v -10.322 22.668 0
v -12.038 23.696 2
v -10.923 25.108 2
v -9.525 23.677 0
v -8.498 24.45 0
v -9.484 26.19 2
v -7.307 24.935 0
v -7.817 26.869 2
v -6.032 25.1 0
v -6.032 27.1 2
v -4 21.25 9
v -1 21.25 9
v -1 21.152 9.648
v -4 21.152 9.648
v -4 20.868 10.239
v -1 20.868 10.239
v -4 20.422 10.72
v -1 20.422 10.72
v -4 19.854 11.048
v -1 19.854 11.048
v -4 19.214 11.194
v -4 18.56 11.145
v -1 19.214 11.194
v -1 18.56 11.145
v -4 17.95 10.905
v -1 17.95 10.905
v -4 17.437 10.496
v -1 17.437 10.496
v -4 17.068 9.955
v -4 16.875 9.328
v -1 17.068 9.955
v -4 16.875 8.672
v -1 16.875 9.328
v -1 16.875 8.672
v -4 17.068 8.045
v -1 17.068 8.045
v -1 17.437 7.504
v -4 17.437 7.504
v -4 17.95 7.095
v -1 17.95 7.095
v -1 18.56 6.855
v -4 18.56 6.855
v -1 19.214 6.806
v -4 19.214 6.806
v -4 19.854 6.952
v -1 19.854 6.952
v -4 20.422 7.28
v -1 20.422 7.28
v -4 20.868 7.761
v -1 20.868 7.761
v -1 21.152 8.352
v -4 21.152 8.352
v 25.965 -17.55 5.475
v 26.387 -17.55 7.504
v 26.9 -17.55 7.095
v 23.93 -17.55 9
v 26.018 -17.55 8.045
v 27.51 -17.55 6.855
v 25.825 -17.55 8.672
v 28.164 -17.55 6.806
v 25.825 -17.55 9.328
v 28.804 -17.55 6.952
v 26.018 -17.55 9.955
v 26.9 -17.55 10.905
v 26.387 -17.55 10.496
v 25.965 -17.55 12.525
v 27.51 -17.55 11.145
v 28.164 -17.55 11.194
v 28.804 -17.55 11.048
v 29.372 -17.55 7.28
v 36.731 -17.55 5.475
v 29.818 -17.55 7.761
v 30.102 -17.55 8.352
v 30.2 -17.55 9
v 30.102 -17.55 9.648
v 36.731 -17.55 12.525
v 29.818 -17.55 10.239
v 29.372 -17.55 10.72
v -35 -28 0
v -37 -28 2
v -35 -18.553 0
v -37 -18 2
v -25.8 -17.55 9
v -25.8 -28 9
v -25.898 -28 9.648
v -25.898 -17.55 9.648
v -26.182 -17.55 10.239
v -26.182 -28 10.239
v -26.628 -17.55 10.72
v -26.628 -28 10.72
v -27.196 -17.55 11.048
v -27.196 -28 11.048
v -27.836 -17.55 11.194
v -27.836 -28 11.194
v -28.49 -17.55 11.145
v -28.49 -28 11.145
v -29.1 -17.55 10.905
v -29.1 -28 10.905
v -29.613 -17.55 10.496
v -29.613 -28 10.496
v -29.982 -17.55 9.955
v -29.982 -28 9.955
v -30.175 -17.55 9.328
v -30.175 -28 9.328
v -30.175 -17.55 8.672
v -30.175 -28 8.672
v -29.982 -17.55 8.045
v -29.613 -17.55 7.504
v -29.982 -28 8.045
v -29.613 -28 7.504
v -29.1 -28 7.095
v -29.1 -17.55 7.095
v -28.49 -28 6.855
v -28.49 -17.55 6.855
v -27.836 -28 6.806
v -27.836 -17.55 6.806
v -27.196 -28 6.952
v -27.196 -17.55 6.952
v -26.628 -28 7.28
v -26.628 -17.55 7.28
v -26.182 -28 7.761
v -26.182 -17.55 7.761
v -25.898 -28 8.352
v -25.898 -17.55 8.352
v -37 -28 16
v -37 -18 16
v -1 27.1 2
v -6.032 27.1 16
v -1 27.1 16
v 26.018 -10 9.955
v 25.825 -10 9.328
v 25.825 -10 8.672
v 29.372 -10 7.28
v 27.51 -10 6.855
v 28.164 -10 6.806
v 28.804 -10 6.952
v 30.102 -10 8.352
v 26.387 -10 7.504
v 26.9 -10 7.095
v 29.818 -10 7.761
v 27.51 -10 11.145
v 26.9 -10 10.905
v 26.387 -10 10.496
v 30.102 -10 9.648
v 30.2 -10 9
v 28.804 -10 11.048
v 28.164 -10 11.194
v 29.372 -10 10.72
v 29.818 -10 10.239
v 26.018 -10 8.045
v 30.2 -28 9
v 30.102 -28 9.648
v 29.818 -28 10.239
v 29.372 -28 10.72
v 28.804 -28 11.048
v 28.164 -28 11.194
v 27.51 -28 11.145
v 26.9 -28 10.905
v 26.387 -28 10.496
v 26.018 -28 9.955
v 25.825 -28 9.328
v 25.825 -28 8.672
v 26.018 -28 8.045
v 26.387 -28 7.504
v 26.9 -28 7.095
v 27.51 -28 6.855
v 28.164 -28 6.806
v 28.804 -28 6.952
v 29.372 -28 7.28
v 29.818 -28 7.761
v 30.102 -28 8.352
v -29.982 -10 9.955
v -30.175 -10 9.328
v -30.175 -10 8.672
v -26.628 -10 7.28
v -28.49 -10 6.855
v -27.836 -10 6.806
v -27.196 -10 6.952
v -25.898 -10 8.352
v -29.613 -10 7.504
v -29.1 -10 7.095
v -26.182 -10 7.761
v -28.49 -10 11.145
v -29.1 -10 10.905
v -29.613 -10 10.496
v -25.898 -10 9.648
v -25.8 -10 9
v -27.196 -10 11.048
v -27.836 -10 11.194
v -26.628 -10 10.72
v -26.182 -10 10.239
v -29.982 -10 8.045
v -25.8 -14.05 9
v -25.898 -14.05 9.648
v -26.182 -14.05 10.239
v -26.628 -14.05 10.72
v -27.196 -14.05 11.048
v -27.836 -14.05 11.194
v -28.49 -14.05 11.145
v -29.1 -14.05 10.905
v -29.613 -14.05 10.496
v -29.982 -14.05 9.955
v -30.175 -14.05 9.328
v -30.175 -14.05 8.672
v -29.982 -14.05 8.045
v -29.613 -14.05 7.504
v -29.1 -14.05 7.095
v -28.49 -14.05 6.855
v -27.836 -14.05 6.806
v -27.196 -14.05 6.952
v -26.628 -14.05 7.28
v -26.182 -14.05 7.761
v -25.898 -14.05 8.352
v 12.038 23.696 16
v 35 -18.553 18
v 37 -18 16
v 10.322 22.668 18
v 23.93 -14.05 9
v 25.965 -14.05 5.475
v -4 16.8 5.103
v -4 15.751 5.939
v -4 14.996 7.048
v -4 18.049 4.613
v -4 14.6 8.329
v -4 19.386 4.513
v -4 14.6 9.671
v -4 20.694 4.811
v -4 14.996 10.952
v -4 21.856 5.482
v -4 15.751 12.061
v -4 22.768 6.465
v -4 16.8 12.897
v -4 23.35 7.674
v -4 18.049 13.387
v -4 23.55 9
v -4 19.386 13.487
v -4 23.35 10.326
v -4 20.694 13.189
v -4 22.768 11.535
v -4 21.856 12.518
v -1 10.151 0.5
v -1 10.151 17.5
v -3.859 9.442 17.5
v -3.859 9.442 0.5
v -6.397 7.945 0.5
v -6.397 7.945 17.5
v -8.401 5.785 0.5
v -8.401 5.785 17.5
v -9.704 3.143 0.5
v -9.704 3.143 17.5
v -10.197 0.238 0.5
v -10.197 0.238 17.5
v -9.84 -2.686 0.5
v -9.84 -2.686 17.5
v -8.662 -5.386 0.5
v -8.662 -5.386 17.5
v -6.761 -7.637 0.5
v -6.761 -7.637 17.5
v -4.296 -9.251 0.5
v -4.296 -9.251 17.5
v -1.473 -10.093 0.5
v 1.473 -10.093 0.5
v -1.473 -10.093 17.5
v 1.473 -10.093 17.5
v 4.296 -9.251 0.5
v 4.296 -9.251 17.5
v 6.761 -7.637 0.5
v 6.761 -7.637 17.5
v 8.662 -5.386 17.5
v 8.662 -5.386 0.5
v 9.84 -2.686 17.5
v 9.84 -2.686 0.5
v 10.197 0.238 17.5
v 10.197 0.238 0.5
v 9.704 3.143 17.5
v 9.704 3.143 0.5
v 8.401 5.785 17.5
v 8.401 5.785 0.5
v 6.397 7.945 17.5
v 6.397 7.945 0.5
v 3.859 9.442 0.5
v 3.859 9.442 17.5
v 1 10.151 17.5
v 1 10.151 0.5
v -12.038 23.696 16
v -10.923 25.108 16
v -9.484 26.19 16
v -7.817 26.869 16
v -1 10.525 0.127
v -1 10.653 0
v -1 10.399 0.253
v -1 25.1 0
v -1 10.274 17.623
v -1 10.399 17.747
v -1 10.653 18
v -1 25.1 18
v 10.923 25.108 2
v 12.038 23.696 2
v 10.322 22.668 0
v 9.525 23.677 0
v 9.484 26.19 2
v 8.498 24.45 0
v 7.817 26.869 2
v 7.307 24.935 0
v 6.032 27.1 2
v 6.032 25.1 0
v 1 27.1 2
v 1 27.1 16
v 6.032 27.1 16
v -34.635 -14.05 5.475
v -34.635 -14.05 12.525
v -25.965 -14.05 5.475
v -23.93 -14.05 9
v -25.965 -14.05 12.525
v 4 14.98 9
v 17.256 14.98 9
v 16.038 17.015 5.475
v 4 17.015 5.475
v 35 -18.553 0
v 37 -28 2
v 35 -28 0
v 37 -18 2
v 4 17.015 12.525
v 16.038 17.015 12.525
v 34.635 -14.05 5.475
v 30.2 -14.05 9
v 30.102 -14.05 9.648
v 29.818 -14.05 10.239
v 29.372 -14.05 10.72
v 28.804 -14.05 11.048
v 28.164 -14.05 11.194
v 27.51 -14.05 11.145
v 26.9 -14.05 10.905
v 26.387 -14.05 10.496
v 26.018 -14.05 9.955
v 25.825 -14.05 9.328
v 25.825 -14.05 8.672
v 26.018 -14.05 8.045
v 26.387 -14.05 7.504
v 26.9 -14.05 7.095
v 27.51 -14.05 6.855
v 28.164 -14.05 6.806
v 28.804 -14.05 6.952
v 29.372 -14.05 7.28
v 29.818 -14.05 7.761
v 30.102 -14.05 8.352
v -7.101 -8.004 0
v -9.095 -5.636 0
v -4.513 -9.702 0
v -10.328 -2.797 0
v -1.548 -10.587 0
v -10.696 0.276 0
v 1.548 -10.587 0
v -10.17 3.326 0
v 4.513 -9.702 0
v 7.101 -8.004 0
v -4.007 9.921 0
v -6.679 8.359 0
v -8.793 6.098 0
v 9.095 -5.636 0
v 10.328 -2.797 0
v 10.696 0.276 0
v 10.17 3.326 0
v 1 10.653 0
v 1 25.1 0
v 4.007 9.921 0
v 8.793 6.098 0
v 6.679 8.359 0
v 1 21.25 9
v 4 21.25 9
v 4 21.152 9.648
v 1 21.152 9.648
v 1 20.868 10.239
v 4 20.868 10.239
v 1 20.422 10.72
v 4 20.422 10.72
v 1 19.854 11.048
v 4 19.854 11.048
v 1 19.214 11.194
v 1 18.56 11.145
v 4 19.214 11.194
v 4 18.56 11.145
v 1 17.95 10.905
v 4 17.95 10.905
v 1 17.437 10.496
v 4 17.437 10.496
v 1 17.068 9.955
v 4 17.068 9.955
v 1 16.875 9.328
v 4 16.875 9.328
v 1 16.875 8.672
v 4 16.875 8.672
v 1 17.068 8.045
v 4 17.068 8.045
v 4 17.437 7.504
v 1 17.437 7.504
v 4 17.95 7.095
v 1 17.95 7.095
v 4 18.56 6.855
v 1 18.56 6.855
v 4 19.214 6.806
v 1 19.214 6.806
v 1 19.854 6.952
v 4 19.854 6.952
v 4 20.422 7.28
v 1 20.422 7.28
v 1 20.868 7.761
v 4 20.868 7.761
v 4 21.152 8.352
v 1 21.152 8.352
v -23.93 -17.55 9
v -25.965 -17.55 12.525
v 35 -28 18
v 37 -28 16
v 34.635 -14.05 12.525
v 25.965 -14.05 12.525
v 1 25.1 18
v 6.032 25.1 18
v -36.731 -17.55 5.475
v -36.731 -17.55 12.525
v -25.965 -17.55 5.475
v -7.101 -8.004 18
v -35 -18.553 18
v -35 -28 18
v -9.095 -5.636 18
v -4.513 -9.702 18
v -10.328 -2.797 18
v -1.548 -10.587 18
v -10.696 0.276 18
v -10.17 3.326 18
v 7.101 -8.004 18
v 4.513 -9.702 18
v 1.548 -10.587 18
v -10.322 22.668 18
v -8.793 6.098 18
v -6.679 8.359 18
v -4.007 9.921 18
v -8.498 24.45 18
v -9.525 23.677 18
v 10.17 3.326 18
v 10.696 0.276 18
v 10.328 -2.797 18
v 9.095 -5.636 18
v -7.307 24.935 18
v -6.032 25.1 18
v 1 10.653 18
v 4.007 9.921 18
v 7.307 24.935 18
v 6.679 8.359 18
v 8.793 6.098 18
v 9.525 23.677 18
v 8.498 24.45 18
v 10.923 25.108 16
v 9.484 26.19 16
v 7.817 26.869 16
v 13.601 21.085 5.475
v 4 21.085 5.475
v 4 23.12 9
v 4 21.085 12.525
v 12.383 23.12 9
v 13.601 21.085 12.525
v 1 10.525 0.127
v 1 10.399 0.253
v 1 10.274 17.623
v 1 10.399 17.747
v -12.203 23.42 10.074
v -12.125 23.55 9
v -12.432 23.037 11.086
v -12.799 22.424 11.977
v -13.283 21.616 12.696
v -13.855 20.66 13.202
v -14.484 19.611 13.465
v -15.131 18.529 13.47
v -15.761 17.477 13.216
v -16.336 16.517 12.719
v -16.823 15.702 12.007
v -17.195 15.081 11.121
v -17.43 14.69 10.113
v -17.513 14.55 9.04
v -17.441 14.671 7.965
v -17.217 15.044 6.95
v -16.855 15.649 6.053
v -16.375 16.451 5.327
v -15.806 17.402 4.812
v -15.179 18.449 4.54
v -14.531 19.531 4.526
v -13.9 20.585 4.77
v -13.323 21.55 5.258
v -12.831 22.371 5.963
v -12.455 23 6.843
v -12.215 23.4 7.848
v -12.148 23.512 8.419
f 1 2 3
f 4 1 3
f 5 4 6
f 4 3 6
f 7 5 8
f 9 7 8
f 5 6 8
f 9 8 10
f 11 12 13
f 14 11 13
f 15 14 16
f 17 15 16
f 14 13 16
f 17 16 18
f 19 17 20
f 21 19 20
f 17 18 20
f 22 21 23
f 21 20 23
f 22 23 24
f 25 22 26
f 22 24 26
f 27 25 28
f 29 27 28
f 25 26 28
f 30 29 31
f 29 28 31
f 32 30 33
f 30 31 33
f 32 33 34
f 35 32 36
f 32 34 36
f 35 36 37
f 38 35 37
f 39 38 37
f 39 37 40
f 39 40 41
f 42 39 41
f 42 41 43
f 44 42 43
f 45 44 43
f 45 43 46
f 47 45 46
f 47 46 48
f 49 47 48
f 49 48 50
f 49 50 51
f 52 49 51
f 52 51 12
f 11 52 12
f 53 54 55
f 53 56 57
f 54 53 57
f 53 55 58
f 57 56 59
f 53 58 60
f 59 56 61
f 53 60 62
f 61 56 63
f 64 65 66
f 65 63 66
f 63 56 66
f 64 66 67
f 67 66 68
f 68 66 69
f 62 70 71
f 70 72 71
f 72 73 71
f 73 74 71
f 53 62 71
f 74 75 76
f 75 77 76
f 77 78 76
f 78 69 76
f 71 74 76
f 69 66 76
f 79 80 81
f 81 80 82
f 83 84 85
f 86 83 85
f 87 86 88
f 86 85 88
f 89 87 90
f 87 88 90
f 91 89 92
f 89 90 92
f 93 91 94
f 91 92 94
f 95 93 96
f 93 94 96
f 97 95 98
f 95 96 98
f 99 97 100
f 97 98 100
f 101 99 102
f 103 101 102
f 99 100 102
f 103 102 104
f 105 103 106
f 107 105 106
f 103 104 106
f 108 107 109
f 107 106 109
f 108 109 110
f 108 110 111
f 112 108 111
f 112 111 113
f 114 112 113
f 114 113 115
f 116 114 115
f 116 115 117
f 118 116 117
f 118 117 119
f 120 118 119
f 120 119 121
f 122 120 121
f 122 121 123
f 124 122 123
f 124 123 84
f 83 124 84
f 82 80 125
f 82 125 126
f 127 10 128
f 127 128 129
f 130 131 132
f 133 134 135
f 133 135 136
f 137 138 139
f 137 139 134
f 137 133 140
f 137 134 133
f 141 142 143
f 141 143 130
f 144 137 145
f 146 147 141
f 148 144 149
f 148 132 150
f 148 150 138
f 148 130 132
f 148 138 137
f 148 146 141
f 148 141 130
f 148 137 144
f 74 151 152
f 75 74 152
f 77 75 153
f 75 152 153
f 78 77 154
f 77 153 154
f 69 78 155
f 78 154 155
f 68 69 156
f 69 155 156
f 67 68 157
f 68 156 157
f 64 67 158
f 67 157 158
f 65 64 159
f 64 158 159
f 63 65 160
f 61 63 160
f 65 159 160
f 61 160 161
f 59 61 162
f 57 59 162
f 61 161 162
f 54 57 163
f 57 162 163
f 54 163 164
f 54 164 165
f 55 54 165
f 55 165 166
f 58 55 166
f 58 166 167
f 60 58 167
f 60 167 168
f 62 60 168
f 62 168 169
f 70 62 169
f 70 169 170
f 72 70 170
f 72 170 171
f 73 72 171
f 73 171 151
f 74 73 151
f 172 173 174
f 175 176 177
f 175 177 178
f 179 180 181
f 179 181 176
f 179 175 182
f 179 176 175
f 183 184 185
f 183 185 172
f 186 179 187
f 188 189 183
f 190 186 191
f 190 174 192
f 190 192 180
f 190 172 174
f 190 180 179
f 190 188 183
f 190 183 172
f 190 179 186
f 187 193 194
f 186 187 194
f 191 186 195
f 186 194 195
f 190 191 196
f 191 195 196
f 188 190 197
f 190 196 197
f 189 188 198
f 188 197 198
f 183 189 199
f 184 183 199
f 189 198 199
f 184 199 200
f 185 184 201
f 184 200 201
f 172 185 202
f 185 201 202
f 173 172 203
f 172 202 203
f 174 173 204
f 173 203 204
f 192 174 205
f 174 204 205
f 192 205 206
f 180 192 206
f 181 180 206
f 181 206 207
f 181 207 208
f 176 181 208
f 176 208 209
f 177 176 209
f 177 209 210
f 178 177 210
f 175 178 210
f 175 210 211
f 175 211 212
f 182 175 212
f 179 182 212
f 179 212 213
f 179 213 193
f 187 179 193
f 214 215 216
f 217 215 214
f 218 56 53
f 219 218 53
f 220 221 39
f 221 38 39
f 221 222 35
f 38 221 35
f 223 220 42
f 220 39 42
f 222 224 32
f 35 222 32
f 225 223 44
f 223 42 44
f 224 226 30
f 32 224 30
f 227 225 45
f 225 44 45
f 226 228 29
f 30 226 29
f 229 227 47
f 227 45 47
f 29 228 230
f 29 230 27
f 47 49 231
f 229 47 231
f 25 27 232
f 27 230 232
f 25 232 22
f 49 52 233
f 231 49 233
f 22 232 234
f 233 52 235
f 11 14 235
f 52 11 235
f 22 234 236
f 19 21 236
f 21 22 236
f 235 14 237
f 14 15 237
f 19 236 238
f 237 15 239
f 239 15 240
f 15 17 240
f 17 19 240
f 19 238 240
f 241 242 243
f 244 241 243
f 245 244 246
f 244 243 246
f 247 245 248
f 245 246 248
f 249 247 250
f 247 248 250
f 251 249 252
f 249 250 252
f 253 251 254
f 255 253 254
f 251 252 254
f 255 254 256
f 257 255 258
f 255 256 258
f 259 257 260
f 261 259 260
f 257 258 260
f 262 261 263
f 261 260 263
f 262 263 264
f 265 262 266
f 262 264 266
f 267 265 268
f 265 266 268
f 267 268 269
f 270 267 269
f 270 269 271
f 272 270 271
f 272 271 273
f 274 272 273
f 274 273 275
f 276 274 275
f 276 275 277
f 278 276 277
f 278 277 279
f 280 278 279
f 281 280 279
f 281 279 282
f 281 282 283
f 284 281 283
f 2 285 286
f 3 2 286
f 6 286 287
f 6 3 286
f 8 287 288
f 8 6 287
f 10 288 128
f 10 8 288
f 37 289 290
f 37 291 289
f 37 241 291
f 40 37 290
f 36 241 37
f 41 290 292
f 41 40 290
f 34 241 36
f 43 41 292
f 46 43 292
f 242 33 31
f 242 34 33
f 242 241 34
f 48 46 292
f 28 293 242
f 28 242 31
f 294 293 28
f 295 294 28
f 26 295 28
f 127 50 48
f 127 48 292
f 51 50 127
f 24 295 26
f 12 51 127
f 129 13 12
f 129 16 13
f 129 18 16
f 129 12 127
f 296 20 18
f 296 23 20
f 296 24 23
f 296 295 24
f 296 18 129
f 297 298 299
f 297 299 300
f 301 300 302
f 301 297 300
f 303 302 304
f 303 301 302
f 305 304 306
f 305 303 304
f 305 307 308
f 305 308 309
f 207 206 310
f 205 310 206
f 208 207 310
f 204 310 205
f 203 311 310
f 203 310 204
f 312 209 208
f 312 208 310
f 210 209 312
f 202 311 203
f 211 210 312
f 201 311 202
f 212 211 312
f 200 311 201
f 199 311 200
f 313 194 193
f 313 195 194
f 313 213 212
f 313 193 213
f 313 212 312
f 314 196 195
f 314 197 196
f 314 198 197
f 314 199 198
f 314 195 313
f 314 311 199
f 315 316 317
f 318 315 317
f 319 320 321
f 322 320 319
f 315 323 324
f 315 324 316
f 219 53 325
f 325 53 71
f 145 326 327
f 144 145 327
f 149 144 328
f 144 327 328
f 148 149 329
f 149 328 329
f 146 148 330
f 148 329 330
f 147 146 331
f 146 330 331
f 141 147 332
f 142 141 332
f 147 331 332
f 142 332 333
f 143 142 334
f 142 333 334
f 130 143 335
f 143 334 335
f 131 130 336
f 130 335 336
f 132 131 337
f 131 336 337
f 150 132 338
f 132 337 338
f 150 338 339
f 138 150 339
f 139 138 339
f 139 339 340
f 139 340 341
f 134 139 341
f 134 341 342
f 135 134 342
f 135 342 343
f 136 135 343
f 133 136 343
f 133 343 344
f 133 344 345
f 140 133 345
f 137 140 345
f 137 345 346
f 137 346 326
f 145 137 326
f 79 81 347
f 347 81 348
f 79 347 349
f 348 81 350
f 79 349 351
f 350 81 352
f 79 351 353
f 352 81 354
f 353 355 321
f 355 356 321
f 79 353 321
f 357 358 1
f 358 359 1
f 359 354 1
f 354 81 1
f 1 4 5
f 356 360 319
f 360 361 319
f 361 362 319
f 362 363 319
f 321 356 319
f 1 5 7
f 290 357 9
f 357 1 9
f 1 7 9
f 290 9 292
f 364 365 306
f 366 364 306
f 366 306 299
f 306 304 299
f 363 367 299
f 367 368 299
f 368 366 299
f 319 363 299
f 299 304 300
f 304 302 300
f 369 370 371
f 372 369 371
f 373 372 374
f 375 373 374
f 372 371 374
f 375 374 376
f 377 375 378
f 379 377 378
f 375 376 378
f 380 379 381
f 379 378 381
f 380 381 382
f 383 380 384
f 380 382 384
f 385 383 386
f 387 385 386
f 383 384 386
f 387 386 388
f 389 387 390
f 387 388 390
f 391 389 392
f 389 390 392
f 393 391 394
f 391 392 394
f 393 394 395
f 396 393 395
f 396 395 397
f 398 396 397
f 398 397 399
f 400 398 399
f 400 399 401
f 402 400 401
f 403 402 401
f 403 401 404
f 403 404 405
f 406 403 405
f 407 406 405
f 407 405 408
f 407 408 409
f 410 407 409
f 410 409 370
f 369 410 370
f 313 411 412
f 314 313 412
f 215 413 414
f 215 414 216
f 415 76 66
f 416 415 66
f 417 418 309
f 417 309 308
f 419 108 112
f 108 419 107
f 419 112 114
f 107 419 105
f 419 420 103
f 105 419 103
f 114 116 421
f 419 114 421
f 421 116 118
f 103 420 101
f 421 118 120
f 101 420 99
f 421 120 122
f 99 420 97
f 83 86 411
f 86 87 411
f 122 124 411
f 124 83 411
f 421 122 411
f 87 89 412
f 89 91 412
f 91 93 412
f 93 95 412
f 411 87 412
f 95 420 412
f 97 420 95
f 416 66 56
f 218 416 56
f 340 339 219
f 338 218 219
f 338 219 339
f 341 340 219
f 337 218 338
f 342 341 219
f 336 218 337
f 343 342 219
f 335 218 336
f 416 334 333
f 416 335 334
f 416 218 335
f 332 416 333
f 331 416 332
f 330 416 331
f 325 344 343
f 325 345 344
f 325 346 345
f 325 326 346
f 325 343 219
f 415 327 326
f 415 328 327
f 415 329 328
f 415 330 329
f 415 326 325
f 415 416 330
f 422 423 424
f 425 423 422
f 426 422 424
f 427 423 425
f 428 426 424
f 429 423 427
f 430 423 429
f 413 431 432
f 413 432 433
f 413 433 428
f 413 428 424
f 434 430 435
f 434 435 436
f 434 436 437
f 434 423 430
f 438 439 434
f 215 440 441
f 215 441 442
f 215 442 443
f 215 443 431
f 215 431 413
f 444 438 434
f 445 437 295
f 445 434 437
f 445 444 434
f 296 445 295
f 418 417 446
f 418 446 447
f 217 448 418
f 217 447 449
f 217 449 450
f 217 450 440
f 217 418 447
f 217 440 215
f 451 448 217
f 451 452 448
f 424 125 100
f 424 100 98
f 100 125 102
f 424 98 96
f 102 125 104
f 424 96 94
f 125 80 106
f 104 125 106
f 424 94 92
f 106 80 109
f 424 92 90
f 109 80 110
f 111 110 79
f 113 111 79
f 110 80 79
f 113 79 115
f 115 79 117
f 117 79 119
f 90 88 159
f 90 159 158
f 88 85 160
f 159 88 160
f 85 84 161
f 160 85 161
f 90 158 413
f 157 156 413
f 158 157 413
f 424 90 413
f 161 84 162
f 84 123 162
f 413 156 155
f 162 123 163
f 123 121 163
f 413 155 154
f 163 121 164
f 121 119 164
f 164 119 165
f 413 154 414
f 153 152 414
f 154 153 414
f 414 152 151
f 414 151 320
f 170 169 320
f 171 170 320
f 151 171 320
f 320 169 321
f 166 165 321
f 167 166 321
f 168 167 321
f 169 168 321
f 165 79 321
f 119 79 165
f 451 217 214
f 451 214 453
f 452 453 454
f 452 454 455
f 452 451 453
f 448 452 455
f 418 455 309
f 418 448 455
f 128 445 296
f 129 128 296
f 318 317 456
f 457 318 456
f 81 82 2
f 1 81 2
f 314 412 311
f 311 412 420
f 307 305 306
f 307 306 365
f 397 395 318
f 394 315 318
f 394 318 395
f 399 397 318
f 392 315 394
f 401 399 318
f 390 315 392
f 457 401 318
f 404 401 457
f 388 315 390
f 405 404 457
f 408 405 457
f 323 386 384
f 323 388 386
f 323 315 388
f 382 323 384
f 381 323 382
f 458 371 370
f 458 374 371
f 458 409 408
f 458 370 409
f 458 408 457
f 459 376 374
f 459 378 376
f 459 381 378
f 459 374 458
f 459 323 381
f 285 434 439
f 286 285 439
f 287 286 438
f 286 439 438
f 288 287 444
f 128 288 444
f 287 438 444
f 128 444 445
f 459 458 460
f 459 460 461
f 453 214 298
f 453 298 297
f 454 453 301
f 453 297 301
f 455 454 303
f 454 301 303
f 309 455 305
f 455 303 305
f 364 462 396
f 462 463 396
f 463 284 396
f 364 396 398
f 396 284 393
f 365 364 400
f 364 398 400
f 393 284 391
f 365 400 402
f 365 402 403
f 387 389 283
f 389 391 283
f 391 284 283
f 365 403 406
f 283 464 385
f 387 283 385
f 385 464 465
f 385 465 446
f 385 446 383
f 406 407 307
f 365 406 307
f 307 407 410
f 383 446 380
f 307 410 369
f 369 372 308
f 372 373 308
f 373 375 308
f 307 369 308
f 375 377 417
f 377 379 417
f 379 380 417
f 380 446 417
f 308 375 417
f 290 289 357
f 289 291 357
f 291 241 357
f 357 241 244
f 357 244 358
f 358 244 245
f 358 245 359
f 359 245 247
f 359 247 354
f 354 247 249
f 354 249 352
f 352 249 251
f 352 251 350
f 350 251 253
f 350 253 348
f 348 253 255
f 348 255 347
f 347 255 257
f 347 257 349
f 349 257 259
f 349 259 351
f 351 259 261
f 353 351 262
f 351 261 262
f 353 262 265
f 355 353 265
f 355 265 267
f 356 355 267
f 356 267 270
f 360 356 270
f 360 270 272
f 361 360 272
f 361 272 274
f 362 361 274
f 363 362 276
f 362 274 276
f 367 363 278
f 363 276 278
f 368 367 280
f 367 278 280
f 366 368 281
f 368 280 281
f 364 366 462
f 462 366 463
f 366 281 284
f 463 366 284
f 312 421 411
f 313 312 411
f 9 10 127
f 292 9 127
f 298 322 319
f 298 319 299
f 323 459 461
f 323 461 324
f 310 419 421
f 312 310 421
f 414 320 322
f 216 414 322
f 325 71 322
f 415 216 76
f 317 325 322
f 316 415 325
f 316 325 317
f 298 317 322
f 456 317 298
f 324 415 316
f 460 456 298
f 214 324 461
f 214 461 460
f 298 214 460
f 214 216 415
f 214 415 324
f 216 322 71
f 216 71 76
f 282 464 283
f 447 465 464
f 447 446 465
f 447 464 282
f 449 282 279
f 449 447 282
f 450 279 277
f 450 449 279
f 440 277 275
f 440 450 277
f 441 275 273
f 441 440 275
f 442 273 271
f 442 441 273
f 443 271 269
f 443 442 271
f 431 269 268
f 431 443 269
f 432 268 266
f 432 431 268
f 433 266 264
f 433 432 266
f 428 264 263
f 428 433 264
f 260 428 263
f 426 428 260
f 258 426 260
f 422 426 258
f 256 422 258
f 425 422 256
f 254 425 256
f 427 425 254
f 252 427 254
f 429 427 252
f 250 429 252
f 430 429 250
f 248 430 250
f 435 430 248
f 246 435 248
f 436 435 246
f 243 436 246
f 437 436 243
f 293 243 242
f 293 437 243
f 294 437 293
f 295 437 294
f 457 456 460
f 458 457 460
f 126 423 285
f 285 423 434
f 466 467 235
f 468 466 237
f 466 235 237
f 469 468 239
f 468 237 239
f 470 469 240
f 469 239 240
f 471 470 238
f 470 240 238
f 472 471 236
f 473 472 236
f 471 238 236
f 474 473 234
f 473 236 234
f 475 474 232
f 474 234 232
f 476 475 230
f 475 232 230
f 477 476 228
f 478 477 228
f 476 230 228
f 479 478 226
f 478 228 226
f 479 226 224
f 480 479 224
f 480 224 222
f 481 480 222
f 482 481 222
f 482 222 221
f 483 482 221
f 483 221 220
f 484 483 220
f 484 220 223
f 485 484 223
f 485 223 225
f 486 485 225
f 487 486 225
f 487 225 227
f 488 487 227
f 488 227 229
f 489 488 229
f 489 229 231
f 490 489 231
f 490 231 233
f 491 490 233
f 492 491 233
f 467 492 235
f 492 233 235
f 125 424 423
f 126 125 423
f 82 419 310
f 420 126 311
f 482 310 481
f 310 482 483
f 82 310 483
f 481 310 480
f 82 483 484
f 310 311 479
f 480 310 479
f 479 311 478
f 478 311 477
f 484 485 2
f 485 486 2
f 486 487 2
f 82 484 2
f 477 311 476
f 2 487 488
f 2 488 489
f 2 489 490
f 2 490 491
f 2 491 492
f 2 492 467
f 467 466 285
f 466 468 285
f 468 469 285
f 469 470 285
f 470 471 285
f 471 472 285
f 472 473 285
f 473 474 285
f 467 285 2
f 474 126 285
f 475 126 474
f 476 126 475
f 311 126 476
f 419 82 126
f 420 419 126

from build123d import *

# Parameters (mm, degrees)
SKETCH009_R     = 4.5
PAD003_DEPTH    = 30
PAD002_DEPTH    = 20
PAD001_DEPTH    = 3.5
SKETCH_W        = 74
SKETCH_H        = 55.1
PAD_DEPTH       = 18
SKETCH001_R     = 10.2
POCKET_DEPTH    = 18.001
POCKET001_DEPTH = 18.001
SKETCH004_W     = 2
SKETCH004_H     = 24.324561
POCKET002_DEPTH = 18.001
SKETCH006_R     = 2.2
POCKET003_DEPTH = 18
SKETCH008_R     = 2.2
POCKET004_DEPTH = 41.001
FILLET_R        = 7
FILLET001_R     = 7
CHAMFER_SIZE    = 2
CHAMFER001_SIZE = 2
CHAMFER002_SIZE = 0.5
CHAMFER003_SIZE = 0.5


with BuildPart() as pad003:
    # Sketch009 → Pad003 (new body)
    with BuildSketch(Plane.YZ.offset(-4)):
        with Locations((19.05, 9)):
            Circle(SKETCH009_R)
    extrude(amount=-PAD003_DEPTH)


with BuildPart() as pad002:
    # Sketch007 → Pad002 (new body)
    with BuildSketch(Plane.YZ.offset(4)):
        Polygon((21.08516, 12.525), (17.01484, 12.525), (14.979681, 9), (17.01484, 5.475), (21.08516, 5.475), (23.120319, 9), align=None)
    extrude(amount=PAD002_DEPTH)


with BuildPart() as pad001:
    # Sketch005 → Pad001 (new body)
    with BuildSketch(Plane.XZ.offset(17.55)):
        Polygon((-23.929681, 9), (-25.96484, 12.525), (-30.03516, 12.525), (-37, 12.525), (-37, 5.475), (-30.03516, 5.475), (-25.96484, 5.475), align=None)
        Polygon((23.929681, 9), (25.96484, 5.475), (30.03516, 5.475), (37, 5.475), (37, 12.525), (30.03516, 12.525), (25.96484, 12.525), align=None)
    extrude(amount=-PAD001_DEPTH)


with BuildPart() as chamfer003:
    # Sketch → Pad (new body)
    with BuildSketch(Plane.XY):
        with Locations((0, -0.45)):
            Rectangle(SKETCH_W, SKETCH_H)
    extrude(amount=PAD_DEPTH)

    # Sketch001 → Pocket (cut, through all)
    with BuildSketch(Plane.XY.offset(18)):
        Circle(SKETCH001_R)
    extrude(amount=-POCKET_DEPTH, mode=Mode.SUBTRACT)

    # Sketch003 → Pocket001 (cut, through all)
    with BuildSketch(Plane.XY.offset(18)):
        Polygon((-37, -18), (-10, 27.1), (-37, 27.1), align=None)
        Polygon((37, -18), (10, 27.1), (37, 27.1), align=None)
    extrude(amount=-POCKET001_DEPTH, mode=Mode.SUBTRACT)

    # Sketch004 → Pocket002 (cut, through all)
    with BuildSketch(Plane.XY.offset(18)):
        with Locations((0, 17.305189)):
            Rectangle(SKETCH004_W, SKETCH004_H)
    extrude(amount=-POCKET002_DEPTH, mode=Mode.SUBTRACT)

    # Cut: cut Pad001
    add(pad001.part, mode=Mode.SUBTRACT)

    # Sketch006 → Pocket003 (cut)
    with BuildSketch(Plane.XZ.offset(28)):
        with Locations((-28, 9)):
            Circle(SKETCH006_R)
        with Locations((28, 9)):
            Circle(SKETCH006_R)
    extrude(amount=-POCKET003_DEPTH, mode=Mode.SUBTRACT)

    # Cut001: cut Pad002
    add(pad002.part, mode=Mode.SUBTRACT)

    # Sketch008 → Pocket004 (cut, through all)
    with BuildSketch(Plane.YZ.offset(4)):
        with Locations((19.05, 9)):
            Circle(SKETCH008_R)
    extrude(amount=-POCKET004_DEPTH, mode=Mode.SUBTRACT)

    # Cut002: cut Pad003
    add(pad003.part, mode=Mode.SUBTRACT)

    # Fillet
    fillet_edges = [chamfer003.edges().sort_by_distance(p)[0] for p in [
        (10, 27.1, 9),
    ]]
    fillet(fillet_edges, radius=FILLET_R)

    # Fillet001
    fillet001_edges = [chamfer003.edges().sort_by_distance(p)[0] for p in [
        (-10, 27.1, 9),
    ]]
    fillet(fillet001_edges, radius=FILLET001_R)

    # Chamfer
    chamfer_edges = [chamfer003.edges().sort_by_distance(p)[0] for p in [
        (9.484015, 26.189711, 18),
        (-37, -23, 18),
        (-24.519057, 2.847797, 18),
        (-9.484015, 26.189711, 18),
        (-3.516071, 27.1, 18),
        (3.516071, 27.1, 18),
        (24.519057, 2.847797, 18),
        (37, -23, 18),
    ]]
    chamfer(chamfer_edges, length=CHAMFER_SIZE)

    # Chamfer001
    chamfer001_edges = [chamfer003.edges().sort_by_distance(p)[0] for p in [
        (37, -23, 0),
        (24.519057, 2.847797, 0),
        (9.484015, 26.189711, 0),
        (3.516071, 27.1, 0),
        (-3.516071, 27.1, 0),
        (-9.484015, 26.189711, 0),
        (-24.519057, 2.847797, 0),
        (-37, -23, 0),
    ]]
    chamfer(chamfer001_edges, length=CHAMFER001_SIZE)

    # Chamfer002
    chamfer002_edges = [chamfer003.edges().sort_by_distance(p)[0] for p in [
        (-6.849818, -7.557777, 0),
        (7.557777, 6.849818, 0),
    ]]
    chamfer(chamfer002_edges, length=CHAMFER002_SIZE)

    # Chamfer003
    chamfer003_edges = [chamfer003.edges().sort_by_distance(p)[0] for p in [
        (-6.849818, -7.557777, 18),
        (7.557777, 6.849818, 18),
    ]]
    chamfer(chamfer003_edges, length=CHAMFER003_SIZE)


solid = chamfer003.part
